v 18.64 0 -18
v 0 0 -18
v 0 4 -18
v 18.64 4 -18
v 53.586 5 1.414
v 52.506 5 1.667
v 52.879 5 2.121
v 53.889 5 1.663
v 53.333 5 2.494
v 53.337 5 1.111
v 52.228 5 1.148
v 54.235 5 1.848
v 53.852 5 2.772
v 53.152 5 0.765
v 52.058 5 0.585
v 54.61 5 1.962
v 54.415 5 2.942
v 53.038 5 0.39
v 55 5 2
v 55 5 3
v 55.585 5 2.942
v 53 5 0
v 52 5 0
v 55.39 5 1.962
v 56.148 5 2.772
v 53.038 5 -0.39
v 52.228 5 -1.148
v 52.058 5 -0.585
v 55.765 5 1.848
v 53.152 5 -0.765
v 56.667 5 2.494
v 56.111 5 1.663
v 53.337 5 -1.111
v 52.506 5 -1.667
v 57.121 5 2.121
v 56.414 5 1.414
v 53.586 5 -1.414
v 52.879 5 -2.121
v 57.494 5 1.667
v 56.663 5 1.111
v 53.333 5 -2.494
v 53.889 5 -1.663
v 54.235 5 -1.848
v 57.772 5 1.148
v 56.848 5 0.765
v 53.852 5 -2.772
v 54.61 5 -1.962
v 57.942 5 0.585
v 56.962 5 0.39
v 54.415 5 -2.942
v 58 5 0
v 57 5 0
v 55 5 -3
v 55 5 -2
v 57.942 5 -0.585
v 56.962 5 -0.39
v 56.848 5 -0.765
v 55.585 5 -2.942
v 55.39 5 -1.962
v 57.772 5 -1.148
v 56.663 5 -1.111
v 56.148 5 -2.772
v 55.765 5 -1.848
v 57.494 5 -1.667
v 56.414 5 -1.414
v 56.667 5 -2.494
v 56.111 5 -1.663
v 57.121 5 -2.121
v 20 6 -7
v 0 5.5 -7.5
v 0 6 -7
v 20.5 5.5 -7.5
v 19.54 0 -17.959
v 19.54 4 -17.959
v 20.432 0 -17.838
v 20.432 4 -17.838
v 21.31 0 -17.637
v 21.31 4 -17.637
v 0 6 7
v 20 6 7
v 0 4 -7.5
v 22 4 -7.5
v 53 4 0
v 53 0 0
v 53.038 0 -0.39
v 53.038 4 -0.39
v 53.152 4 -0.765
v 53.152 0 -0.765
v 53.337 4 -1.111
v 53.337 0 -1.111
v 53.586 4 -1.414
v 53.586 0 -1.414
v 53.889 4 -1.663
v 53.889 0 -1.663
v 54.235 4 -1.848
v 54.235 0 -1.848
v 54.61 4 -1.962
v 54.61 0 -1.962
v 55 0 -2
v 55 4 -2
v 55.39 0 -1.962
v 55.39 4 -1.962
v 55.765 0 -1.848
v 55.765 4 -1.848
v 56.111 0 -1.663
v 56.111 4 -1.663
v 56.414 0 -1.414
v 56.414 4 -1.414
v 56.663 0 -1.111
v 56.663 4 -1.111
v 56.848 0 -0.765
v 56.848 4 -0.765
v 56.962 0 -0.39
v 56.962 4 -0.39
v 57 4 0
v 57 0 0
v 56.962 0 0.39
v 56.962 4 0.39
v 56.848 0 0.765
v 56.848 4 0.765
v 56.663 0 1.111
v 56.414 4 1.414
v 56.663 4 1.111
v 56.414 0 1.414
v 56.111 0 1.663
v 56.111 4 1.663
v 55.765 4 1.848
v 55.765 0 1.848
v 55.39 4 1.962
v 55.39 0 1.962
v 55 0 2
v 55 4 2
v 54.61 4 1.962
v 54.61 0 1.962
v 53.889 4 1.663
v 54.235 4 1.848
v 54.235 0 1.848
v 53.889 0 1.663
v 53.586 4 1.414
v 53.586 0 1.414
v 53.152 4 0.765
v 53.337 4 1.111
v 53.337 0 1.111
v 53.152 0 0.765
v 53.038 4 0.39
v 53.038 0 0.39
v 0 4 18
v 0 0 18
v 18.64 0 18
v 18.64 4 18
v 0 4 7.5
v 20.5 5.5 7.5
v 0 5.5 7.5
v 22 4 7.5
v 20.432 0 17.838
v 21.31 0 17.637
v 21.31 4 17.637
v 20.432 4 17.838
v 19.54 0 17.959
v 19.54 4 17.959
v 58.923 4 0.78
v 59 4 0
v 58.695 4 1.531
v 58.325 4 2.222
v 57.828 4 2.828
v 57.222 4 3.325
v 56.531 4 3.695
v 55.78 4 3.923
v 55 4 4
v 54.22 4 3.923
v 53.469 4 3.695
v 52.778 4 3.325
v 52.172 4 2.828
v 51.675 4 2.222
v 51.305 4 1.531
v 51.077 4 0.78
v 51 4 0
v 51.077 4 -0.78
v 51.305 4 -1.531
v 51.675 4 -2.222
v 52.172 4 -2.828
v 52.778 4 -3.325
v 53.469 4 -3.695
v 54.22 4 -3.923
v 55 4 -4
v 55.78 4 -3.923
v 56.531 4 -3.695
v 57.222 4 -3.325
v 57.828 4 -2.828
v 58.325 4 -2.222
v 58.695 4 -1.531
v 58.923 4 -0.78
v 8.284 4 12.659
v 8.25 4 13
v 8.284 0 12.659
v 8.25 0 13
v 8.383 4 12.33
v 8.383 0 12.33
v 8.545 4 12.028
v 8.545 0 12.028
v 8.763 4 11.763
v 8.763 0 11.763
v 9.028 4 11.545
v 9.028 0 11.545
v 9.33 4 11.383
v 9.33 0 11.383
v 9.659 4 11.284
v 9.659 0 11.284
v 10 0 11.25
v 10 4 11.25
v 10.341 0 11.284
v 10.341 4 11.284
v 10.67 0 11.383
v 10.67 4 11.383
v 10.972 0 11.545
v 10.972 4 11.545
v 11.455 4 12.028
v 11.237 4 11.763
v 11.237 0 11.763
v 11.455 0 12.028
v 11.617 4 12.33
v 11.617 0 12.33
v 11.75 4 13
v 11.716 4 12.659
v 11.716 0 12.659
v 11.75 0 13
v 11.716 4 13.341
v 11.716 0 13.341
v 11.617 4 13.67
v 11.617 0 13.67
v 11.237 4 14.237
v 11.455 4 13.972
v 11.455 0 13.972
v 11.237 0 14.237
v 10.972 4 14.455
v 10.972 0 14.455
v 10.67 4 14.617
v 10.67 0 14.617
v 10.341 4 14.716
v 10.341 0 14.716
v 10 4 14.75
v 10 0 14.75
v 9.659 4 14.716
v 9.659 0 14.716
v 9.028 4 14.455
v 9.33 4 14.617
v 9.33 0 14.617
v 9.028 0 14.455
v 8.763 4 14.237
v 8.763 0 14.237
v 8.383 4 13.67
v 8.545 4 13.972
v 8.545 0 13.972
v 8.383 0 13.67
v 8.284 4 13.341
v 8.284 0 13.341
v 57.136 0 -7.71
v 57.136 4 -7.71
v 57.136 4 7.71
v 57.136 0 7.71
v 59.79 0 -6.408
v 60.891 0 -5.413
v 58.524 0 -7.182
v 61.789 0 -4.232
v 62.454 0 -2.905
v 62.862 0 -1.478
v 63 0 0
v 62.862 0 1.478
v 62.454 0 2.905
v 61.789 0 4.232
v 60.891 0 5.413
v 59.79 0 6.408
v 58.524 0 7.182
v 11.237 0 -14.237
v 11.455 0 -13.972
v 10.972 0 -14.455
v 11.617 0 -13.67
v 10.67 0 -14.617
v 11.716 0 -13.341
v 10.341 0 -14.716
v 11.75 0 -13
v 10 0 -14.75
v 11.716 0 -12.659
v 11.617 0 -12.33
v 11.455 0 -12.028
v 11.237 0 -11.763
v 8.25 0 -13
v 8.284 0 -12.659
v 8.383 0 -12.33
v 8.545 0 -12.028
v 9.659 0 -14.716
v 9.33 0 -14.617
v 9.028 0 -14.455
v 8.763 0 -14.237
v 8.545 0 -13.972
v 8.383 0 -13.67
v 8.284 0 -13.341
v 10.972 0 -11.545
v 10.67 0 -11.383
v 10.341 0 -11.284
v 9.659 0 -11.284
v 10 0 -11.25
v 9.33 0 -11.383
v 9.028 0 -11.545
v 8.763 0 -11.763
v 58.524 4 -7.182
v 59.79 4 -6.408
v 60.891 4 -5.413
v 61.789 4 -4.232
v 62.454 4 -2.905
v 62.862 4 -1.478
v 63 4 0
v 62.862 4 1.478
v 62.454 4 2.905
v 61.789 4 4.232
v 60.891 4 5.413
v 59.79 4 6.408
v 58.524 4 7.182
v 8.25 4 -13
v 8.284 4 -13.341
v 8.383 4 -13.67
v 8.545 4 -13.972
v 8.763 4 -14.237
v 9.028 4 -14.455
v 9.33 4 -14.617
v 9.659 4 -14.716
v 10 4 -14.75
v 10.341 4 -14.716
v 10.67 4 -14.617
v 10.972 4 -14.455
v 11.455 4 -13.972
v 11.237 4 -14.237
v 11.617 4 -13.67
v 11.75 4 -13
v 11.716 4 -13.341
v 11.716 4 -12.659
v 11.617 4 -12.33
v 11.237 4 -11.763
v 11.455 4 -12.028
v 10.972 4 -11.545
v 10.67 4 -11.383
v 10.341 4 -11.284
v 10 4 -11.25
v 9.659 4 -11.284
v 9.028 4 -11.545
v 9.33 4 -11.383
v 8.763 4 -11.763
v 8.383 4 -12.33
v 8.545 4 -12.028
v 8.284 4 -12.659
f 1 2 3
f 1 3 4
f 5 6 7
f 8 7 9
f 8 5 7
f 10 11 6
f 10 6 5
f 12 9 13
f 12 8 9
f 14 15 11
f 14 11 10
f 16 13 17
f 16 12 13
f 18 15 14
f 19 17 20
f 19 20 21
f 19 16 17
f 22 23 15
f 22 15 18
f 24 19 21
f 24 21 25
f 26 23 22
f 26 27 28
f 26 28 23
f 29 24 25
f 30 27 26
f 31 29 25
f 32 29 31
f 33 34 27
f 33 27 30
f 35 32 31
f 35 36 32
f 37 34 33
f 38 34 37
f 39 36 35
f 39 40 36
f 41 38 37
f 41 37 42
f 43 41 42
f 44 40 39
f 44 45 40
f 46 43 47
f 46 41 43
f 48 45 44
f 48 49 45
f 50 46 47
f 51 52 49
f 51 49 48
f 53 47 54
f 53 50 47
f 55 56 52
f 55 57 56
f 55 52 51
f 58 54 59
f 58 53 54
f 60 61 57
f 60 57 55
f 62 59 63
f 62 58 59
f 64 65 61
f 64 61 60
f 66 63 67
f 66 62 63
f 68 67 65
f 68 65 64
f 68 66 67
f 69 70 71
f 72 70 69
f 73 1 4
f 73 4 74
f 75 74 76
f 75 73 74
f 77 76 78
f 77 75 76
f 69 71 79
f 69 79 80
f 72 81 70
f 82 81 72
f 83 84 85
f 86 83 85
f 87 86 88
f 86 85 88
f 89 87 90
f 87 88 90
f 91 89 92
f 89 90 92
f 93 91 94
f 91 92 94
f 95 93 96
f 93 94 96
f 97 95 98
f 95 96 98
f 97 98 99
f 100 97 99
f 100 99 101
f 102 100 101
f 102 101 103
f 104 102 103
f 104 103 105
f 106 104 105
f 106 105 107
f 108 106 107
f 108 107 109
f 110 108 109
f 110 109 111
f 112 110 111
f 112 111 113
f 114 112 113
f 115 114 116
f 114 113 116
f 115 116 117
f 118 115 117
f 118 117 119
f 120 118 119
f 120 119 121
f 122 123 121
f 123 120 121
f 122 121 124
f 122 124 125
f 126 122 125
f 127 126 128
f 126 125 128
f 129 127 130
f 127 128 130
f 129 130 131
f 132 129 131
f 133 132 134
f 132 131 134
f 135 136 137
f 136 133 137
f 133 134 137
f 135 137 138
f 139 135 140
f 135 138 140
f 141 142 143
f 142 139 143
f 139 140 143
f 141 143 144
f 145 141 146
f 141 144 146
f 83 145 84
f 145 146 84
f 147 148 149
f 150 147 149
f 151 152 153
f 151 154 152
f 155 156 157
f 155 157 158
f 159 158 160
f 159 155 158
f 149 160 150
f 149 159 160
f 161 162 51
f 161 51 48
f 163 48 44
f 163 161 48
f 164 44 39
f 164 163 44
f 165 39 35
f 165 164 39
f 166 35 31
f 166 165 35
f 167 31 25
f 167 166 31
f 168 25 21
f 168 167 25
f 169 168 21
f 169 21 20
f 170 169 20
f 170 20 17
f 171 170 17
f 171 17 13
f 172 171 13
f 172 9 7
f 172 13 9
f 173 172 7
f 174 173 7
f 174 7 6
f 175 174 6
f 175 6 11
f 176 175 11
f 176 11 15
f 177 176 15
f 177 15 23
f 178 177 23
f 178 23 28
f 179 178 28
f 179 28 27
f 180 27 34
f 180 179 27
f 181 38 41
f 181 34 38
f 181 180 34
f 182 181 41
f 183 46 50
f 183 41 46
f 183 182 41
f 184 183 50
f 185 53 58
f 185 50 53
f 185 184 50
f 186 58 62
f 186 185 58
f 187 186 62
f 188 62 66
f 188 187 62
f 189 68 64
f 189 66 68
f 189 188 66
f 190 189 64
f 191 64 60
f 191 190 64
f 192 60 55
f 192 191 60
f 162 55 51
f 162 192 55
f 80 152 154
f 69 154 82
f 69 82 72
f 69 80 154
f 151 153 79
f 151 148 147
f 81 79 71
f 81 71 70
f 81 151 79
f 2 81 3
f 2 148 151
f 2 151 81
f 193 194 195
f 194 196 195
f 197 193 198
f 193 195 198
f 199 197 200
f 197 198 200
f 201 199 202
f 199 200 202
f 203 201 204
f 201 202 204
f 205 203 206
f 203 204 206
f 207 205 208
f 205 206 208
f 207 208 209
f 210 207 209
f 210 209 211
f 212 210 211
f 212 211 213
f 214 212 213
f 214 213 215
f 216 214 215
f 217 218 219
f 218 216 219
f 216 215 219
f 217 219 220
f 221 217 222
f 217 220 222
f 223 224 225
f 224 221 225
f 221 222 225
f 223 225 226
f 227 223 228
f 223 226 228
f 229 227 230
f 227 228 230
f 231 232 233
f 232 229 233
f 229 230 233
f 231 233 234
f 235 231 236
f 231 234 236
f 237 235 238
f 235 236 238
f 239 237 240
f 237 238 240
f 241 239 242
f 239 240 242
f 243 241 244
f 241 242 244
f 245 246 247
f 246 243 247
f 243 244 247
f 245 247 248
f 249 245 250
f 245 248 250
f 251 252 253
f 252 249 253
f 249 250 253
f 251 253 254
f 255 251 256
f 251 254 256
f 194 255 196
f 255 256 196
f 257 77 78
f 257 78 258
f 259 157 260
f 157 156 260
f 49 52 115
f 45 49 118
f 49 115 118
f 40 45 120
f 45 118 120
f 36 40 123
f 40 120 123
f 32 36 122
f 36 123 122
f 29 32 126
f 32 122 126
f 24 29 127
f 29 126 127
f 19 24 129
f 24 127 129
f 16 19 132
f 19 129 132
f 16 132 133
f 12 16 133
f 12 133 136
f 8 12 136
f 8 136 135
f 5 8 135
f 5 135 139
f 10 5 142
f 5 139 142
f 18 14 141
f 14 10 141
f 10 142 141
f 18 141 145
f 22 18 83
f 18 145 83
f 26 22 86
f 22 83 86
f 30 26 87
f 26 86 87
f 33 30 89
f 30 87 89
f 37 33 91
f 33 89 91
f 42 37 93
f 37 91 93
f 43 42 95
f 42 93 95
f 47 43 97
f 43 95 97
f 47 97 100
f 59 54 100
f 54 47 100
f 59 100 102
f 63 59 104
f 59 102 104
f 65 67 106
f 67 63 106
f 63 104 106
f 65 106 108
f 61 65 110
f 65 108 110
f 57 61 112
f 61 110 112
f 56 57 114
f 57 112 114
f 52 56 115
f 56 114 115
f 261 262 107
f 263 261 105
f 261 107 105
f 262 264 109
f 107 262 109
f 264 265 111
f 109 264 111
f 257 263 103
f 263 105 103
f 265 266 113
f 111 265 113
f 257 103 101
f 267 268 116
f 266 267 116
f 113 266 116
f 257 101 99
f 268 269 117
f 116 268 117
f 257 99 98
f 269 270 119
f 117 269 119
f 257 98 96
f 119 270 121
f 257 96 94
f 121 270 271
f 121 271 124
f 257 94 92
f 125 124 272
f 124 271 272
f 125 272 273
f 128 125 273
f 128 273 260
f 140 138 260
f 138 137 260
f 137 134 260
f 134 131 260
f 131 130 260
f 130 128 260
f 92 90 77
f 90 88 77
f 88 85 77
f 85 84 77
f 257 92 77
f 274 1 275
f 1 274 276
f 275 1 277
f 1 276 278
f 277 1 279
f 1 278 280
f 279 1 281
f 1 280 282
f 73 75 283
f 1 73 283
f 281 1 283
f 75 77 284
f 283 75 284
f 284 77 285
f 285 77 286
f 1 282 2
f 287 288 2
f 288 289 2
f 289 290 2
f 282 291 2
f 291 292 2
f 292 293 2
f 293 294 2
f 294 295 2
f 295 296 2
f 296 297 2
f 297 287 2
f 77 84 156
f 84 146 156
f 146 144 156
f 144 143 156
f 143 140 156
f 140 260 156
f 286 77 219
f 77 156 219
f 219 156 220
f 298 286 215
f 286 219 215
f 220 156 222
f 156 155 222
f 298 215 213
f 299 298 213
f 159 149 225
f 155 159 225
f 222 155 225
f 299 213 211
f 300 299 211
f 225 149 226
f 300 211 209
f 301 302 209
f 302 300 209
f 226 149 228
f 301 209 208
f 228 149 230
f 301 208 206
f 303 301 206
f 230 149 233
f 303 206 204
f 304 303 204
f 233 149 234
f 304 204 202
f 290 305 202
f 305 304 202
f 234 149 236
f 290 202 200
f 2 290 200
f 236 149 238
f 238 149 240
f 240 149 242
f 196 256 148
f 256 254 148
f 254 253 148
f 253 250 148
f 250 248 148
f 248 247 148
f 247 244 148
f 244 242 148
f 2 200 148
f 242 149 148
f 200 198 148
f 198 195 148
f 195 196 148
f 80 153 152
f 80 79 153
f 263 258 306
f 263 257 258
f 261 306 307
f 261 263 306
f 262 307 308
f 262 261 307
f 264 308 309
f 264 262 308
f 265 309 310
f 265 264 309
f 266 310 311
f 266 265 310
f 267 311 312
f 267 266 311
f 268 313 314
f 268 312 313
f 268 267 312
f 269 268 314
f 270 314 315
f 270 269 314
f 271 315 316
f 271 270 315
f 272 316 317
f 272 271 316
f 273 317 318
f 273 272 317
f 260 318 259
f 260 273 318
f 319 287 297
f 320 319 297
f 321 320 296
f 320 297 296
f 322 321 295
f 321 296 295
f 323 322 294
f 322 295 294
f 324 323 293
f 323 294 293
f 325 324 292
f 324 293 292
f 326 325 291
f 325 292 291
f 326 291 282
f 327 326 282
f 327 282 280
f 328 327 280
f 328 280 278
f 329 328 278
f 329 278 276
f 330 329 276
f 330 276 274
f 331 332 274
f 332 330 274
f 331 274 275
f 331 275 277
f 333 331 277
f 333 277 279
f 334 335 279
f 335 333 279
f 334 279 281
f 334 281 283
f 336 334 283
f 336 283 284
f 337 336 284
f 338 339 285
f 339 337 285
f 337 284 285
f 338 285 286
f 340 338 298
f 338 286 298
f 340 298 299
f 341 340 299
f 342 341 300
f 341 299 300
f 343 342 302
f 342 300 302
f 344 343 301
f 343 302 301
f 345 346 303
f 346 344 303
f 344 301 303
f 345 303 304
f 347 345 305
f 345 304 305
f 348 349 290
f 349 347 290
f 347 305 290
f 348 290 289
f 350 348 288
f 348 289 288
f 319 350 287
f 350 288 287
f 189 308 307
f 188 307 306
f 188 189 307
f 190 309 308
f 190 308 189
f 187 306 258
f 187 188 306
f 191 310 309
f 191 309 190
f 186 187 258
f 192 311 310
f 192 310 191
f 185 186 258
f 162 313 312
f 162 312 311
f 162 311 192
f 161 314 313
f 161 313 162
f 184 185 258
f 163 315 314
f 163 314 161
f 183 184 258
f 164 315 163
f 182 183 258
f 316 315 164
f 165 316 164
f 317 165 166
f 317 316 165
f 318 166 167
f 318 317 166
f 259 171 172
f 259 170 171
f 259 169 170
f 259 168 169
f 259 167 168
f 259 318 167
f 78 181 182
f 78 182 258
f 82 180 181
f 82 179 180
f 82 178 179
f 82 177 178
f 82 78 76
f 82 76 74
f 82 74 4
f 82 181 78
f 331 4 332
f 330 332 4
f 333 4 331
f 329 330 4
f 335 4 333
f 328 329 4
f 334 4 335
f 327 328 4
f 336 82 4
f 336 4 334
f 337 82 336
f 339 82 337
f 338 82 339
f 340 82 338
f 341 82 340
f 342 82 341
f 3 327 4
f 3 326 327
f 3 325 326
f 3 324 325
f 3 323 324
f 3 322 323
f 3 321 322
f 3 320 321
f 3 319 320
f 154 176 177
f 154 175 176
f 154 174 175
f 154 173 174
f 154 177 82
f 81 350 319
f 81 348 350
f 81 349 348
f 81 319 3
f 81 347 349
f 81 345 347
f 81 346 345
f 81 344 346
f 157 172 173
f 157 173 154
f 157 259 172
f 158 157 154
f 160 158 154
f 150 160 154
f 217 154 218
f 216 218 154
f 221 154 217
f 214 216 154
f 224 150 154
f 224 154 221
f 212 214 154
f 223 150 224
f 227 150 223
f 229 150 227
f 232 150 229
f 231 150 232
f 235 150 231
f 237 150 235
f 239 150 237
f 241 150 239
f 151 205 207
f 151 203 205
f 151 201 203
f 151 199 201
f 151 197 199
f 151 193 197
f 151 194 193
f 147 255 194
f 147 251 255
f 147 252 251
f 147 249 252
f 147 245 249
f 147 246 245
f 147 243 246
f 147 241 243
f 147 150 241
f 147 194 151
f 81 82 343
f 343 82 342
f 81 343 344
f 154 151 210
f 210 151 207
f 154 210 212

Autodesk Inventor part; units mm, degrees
ref_plane "YZ Plane" through (0, 0, 0) normal (1, 0, 0) x (0, 1, 0)
ref_plane "XZ Plane" through (0, 0, 0) normal (0, 1, 0) x (-1, 0, 0)
ref_plane "XY Plane" through (0, 0, 0) normal (0, 0, 1) x (1, 0, 0)
sketch "Эскиз1" plane through (0, 0, 0) normal (0, 1, 0) x (-1, 0, 0)
  line L0 (0, 18) -> (0, -18)
  arc A0 (-57.1363, 7.7095) -> (-57.1363, -7.7095) centre (-55, 0) ccw
  line L1 (0, 0) -> (-6.25, 0) construction
  line L2 (0, 18) -> (-18.6401, 18)
  line L3 (-21.3105, 17.6369) -> (-57.1363, 7.7095)
  line L4 (0, -18) -> (-18.6401, -18)
  line L5 (-21.3105, -17.6369) -> (-57.1363, -7.7095)
  circle A1 centre (-55, 0) radius 2
  arc A2 (-18.6401, 18) -> (-21.3105, 17.6369) centre (-18.6401, 8) ccw
  arc A3 (-21.3105, -17.6369) -> (-18.6401, -18) centre (-18.6401, -8) ccw
  circle A4 centre (-10, -13) radius 1.75
  circle A5 centre (-10, 13) radius 1.75
  line L6 (-10, 13) -> (-10, -13) construction
  point P0 (-20, 18)
  dimension "d0" = 16
  dimension "d1" = 36
  dimension "d2" = 55
  dimension "d3" = 20
  dimension "d4" = 4
  dimension "d5" = 10
  dimension "d18" = 3.5
  dimension "d19" = 13
  dimension "d20" = 10
extrude "Выдавливание1" add sketch "Эскиз1" along normal blind 4
sketch "Эскиз2" plane through (0, 4, 0) normal (0, 1, 0) x (1, 0, 0)
  line L0 (0, 0) -> (14.985, 0) construction
  line L1 (0, 7.5) -> (22, 7.5)
  line L2 (22, 7.5) -> (22, -7.5)
  line L3 (22, -7.5) -> (0, -7.5)
  line L4 (0, -7.5) -> (0, 7.5)
  line L5 (0, 18) -> (0, -18) projected
  dimension "d8" = 15
  dimension "d9" = 22
extrude "Выдавливание2" add sketch "Эскиз2" along normal blind 2
chamfer "Фаска1" distance 2 angle 45 1 edges at (22, 6, 0)
chamfer "Фаска2" distance 0.5 angle 45 2 edges at (10.0002, 6, 7.5) (10.0003, 6, -7.5)
sketch "Эскиз4" plane through (0, 4, 0) normal (0, 1, 0) x (1, 0, 0)
  circle A0 centre (55, 0) radius 2 projected
  circle A1 centre (55, 0) radius 3
  point P0 (0, 0)
  dimension "d21" = 1
extrude "Выдавливание3" add sketch "Эскиз4" along normal blind 1
chamfer "Фаска3" distance 1 angle 45 1 edges at (52, 4, 0)
properties part number "04-06-Рычаг верхний"
